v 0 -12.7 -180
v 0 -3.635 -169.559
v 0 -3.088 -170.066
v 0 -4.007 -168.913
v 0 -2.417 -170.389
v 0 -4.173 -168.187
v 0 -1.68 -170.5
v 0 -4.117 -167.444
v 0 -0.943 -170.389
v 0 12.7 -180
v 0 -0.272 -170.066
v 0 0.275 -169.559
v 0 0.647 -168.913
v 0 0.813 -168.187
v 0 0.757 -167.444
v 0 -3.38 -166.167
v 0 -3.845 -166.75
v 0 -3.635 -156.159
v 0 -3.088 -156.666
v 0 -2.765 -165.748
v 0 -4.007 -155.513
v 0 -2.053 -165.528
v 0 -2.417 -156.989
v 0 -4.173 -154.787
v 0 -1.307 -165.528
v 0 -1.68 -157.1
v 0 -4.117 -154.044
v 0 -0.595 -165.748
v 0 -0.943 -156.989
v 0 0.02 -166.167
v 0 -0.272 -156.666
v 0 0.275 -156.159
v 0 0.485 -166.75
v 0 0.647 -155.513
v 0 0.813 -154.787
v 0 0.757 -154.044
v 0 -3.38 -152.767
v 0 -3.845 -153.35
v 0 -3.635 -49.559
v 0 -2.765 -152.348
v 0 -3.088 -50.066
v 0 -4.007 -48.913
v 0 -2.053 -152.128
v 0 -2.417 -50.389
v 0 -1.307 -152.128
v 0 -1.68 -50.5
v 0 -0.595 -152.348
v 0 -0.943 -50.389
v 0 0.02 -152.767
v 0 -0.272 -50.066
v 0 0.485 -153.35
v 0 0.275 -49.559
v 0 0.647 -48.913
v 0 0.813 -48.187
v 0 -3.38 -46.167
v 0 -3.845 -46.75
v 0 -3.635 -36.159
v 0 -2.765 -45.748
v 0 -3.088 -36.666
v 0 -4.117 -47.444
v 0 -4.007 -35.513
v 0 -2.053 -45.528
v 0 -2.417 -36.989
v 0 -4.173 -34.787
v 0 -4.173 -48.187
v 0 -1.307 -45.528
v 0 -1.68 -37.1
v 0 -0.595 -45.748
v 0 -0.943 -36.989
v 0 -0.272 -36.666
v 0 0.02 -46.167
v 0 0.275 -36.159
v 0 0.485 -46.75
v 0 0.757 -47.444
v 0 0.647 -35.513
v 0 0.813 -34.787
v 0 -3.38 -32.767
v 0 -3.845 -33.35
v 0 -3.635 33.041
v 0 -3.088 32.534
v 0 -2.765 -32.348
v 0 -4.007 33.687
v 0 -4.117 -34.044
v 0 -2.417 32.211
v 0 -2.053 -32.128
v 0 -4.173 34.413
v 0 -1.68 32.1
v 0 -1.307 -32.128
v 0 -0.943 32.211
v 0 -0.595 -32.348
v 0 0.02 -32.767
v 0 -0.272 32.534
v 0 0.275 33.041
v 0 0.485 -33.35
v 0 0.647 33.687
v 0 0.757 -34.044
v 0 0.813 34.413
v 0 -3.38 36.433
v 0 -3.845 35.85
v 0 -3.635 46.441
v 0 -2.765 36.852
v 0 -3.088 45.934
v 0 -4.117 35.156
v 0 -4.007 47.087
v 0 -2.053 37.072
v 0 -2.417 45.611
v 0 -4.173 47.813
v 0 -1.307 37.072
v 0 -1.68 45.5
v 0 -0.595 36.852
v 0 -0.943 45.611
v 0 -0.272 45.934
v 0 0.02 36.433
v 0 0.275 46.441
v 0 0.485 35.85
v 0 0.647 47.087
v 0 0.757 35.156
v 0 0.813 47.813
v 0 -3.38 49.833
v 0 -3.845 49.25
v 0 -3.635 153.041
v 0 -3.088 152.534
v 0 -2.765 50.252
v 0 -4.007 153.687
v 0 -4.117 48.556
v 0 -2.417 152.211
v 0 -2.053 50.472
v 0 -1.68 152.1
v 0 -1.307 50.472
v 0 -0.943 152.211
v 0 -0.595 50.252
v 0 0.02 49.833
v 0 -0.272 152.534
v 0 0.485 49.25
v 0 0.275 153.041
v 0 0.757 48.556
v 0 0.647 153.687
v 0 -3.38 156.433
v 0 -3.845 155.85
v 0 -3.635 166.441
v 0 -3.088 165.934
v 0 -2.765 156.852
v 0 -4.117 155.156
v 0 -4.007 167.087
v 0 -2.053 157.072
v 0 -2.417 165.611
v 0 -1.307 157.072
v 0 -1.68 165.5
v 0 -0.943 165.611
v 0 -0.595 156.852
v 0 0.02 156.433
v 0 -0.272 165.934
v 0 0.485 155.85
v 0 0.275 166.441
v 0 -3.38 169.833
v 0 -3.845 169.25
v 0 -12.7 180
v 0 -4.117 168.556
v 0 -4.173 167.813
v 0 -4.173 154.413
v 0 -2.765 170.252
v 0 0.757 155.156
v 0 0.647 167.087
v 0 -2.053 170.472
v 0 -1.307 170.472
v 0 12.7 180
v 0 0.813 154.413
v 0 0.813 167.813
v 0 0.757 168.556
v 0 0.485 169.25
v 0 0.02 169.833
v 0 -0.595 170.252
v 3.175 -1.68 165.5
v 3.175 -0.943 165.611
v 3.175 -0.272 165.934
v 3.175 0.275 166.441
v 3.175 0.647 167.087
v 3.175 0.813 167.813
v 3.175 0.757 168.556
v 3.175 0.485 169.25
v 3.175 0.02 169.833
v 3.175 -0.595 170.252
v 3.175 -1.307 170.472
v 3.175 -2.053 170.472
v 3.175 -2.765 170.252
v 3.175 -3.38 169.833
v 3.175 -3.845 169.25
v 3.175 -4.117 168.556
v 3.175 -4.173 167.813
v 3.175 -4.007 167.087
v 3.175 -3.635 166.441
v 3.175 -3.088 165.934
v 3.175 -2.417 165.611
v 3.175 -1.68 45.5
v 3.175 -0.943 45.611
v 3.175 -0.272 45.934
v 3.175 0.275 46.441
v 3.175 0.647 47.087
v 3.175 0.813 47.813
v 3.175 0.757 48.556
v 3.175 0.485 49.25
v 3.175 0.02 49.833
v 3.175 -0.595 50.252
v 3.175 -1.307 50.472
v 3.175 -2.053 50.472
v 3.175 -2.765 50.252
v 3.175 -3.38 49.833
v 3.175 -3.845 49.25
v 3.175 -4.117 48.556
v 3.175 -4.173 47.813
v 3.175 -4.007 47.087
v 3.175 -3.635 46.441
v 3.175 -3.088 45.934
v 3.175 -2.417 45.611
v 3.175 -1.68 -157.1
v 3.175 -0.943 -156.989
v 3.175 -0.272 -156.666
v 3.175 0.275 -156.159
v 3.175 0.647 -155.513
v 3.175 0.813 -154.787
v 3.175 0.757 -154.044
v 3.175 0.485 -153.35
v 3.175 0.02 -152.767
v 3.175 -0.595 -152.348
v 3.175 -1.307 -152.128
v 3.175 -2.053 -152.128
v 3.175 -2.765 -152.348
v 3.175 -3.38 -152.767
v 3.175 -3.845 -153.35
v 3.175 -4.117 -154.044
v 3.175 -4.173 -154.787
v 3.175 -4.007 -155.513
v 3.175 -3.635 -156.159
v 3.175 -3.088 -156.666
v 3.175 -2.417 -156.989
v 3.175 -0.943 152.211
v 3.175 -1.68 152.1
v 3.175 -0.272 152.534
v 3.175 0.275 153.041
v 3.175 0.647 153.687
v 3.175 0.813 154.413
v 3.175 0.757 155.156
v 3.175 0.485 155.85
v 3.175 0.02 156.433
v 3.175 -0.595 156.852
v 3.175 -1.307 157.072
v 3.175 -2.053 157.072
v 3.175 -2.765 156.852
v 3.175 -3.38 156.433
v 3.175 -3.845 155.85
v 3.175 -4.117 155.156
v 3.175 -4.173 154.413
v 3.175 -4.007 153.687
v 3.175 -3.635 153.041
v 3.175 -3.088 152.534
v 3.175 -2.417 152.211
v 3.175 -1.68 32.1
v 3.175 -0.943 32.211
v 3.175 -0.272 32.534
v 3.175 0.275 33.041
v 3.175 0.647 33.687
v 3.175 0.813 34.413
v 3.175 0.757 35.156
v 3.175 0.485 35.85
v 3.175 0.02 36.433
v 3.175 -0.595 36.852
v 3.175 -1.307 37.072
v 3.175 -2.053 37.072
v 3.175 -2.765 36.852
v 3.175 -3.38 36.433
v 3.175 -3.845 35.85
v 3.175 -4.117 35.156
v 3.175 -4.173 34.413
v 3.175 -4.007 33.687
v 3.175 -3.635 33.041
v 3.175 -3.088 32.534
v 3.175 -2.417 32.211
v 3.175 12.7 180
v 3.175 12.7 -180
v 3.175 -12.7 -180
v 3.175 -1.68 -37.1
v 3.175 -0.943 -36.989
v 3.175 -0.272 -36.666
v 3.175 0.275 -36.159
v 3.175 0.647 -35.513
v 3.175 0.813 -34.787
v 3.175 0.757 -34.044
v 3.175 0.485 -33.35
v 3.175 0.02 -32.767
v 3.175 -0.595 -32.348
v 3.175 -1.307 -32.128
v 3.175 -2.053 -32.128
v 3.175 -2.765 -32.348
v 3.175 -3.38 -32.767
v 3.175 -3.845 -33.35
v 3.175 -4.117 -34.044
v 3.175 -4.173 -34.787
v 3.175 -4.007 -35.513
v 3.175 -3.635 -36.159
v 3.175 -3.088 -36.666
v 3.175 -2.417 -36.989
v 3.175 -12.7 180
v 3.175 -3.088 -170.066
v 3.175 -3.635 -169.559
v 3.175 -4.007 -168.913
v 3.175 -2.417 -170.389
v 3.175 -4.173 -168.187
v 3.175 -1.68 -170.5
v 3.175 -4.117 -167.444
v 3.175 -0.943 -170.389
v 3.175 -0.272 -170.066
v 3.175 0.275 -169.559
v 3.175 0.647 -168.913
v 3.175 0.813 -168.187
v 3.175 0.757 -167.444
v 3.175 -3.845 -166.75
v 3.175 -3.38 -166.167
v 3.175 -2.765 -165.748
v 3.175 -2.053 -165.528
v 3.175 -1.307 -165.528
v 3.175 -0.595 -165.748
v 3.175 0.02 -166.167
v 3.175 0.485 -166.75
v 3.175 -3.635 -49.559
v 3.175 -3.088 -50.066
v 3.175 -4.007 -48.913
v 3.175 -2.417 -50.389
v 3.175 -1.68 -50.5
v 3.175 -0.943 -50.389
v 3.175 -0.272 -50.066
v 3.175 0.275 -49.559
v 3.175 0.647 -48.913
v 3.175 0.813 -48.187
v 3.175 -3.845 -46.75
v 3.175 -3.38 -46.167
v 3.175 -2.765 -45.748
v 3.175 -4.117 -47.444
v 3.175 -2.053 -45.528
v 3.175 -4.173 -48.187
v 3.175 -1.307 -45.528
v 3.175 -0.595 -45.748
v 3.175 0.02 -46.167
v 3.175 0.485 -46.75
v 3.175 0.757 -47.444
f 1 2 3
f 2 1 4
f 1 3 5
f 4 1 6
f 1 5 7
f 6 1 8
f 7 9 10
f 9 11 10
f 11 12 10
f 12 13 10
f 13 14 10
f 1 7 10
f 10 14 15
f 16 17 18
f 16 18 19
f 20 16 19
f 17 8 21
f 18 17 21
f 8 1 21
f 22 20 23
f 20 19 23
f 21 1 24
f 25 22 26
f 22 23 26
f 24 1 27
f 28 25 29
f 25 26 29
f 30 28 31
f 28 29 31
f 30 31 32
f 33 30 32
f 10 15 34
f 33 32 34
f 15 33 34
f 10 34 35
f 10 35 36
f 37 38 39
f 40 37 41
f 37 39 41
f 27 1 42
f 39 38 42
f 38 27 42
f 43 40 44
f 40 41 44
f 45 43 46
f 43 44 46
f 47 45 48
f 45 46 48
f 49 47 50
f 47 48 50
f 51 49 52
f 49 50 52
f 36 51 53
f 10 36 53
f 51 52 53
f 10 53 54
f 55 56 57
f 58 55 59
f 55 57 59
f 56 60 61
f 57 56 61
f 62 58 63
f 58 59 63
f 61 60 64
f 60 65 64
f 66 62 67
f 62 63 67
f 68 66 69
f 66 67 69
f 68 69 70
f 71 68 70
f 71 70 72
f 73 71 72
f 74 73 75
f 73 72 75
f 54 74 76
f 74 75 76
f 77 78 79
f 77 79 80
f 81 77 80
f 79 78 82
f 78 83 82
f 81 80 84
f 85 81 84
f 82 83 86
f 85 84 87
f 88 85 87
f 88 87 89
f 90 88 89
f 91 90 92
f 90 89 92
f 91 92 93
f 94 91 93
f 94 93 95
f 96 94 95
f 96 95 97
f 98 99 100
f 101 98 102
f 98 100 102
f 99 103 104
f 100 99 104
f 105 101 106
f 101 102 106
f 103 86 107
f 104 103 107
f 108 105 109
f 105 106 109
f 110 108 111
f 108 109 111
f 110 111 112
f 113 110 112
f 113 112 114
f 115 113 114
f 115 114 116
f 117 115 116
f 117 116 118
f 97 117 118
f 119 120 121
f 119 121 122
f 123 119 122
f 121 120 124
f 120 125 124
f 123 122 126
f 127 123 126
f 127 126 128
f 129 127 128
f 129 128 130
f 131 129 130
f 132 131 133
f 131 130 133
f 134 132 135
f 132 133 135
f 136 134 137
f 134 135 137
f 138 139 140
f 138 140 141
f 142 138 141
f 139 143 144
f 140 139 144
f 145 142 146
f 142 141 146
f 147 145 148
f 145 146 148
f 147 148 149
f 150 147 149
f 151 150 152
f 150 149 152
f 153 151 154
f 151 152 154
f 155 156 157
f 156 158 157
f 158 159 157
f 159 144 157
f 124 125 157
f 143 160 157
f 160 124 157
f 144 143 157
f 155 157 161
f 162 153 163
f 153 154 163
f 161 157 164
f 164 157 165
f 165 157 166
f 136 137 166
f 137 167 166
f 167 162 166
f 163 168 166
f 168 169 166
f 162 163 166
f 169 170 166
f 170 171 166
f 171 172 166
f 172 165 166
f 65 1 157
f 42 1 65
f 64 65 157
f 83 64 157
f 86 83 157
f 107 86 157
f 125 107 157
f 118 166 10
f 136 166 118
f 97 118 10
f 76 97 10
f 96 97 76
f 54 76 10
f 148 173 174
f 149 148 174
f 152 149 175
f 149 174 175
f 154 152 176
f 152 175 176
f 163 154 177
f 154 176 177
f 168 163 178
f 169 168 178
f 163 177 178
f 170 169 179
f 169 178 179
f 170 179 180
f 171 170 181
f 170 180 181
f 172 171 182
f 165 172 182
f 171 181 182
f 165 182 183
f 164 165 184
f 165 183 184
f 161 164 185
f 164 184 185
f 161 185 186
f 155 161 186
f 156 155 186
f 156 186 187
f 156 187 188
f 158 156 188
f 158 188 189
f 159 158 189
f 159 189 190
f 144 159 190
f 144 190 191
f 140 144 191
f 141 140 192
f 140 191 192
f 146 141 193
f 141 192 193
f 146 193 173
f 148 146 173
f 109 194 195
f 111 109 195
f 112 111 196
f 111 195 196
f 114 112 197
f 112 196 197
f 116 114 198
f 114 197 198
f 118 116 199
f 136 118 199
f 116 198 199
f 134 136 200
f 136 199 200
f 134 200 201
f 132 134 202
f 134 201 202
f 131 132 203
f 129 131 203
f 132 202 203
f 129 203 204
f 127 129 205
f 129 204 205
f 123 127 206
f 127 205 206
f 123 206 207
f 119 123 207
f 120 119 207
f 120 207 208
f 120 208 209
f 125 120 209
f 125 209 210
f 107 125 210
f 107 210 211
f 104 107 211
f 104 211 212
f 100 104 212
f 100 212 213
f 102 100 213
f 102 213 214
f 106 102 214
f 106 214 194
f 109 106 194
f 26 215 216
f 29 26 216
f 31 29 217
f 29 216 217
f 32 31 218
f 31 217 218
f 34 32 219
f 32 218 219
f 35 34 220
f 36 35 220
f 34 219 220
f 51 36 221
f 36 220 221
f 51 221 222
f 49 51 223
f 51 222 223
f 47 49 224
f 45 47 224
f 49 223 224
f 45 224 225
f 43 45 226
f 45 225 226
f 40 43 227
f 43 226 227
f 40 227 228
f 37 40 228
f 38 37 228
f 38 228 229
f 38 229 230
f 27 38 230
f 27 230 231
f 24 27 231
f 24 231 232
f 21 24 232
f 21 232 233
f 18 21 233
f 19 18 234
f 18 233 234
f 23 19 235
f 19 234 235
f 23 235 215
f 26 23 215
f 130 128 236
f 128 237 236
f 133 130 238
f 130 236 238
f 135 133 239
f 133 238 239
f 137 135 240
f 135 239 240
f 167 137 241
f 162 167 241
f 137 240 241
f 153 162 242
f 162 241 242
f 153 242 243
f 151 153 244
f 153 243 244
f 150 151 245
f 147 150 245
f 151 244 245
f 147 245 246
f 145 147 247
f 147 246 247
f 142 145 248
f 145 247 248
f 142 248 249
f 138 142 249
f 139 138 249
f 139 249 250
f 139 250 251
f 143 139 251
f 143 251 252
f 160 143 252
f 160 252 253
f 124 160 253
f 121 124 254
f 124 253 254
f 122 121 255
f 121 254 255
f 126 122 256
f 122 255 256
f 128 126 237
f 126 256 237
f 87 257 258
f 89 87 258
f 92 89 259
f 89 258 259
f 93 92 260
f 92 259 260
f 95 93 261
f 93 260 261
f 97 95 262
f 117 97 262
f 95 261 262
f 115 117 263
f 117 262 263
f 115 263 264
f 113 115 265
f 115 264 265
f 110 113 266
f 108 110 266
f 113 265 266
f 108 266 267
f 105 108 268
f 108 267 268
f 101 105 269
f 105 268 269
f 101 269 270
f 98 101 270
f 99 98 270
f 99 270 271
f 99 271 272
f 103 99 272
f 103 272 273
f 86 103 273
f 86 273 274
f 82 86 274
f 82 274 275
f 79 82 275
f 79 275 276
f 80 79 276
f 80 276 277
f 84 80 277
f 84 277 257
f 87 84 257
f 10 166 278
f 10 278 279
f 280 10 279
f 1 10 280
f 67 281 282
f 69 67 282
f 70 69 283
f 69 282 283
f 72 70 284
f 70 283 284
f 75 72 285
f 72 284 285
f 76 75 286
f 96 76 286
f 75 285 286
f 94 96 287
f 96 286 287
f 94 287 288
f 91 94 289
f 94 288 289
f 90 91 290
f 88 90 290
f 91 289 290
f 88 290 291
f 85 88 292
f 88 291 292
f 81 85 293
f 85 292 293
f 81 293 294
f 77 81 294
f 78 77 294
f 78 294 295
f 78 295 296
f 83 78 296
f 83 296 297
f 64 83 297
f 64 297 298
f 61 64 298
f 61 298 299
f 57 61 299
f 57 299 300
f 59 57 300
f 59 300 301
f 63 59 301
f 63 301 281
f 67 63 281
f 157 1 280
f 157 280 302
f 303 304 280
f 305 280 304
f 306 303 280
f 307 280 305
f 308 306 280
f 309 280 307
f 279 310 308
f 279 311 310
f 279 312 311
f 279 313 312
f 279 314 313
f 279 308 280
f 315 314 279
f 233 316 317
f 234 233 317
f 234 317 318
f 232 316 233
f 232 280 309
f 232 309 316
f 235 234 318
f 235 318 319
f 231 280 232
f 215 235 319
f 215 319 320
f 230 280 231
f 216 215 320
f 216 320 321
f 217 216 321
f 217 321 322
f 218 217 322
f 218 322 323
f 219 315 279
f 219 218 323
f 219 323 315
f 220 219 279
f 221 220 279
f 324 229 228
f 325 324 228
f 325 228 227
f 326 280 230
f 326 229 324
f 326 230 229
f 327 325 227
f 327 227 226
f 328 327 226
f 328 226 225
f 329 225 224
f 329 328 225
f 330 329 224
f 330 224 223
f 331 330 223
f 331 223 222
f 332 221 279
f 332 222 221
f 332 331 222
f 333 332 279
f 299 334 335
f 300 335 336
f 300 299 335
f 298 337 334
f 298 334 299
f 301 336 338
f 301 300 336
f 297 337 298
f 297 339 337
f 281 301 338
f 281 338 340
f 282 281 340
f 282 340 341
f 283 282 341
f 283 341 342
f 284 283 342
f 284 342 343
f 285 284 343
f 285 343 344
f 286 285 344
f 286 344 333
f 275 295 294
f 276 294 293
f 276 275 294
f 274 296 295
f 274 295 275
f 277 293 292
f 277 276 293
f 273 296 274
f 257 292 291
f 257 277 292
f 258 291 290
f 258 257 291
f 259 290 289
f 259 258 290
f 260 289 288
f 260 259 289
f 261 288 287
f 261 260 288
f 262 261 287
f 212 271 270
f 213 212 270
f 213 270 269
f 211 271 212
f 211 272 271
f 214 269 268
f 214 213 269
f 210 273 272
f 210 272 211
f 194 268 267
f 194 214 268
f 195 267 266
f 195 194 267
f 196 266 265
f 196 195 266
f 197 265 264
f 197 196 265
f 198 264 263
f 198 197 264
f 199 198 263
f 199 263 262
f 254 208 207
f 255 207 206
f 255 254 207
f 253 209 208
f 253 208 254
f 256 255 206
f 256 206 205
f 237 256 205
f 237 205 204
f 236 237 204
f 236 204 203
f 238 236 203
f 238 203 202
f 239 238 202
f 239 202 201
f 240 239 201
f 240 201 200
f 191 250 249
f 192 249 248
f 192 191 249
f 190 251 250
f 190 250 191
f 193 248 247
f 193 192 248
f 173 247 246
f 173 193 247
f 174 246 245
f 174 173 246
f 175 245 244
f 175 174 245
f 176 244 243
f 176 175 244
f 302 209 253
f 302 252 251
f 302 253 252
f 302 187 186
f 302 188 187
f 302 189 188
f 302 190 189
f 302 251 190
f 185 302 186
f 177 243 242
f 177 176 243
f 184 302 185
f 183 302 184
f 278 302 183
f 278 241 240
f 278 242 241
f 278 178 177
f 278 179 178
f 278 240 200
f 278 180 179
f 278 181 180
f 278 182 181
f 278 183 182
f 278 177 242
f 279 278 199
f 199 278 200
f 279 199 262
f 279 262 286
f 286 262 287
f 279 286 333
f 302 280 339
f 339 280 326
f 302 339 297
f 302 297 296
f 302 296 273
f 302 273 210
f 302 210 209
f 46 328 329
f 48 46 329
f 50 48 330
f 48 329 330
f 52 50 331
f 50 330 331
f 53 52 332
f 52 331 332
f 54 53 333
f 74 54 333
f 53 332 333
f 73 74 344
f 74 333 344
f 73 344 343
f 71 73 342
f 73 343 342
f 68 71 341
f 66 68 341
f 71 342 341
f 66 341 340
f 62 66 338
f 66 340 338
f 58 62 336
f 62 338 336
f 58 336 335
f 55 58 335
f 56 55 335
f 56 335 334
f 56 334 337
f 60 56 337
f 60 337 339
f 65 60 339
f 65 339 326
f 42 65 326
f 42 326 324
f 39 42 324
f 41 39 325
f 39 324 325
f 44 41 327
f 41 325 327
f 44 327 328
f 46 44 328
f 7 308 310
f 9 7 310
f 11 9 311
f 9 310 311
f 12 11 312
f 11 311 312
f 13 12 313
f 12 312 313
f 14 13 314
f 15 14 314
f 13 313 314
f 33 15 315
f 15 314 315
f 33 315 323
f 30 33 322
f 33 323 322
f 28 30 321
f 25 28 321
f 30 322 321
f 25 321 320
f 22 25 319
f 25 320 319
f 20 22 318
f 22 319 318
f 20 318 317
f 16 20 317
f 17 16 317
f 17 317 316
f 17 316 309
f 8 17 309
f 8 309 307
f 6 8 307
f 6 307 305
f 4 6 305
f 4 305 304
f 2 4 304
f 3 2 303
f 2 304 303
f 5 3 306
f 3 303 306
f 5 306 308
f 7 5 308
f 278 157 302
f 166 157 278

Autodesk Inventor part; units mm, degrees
ref_plane "YZ Plane" through (0, 0, 0) normal (1, 0, 0) x (0, 1, 0)
ref_plane "XZ Plane" through (0, 0, 0) normal (0, 1, 0) x (-1, 0, 0)
ref_plane "XY Plane" through (0, 0, 0) normal (0, 0, 1) x (1, 0, 0)
sketch "Sketch1" plane through (0, 0, 0) normal (1, 0, 0) x (0, 1, 0)
  line L0 (-12.7, 180) -> (12.7, 180)
  line L1 (12.7, 180) -> (12.7, -180)
  line L2 (12.7, -180) -> (-12.7, -180)
  line L3 (-12.7, -180) -> (-12.7, 180)
  line L4 (-12.7, 180) -> (12.7, -180) construction
  line L5 (12.7, 180) -> (-12.7, -180) construction
  point P0 (0, 0)
  dimension "d0" = 25.4
  dimension "d1" = 360
extrude "Extrusion1" add sketch "Sketch1" along normal blind 3.175
sketch "Sketch2" plane through (3.175, 0, 0) normal (1, 0, 0) x (0, 0, -1)
  line L0 (180, -12.7) -> (180, 12.7) projected
  line L1 (180, 12.7) -> (-180, 12.7) projected
  line L2 (-180, 12.7) -> (-180, -12.7) projected
  line L3 (-180, -12.7) -> (180, -12.7) projected
  circle A0 centre (-168, -1.68) radius 2.5
  line L4 (180, 12.7) -> (-180, 12.7) projected
  line L5 (0, 12.7) -> (0, -12.7)
  circle A1 centre (168, -1.68) radius 2.5
  circle A2 centre (-154.6, -1.68) radius 2.5
  circle A3 centre (154.6, -1.68) radius 2.5
  point P0 (0, 0)
  dimension "d4" = 5
  dimension "d5" = 14.38
  dimension "d6" = 12
  dimension "d9" = 13.4
extrude "Extrusion2" cut sketch "Sketch2" against normal through all contours A0 | A1 | A2 | A3
sketch "Sketch3" plane through (3.175, 0, 0) normal (1, 0, 0) x (0, 0, -1)
  circle A0 centre (-168, -1.68) radius 2.5 projected
  circle A1 centre (154.6, -1.68) radius 2.5 projected
  circle A2 centre (168, -1.68) radius 2.5 projected
  circle A3 centre (-154.6, -1.68) radius 2.5 projected
  line L0 (180, -12.7) -> (180, 12.7) projected
  line L1 (180, 12.7) -> (-180, 12.7) projected
  line L2 (-180, 12.7) -> (-180, -12.7) projected
  line L3 (-180, -12.7) -> (180, -12.7) projected
  circle A4 centre (-168, -1.68) radius 2.5
  circle A5 centre (-154.6, -1.68) radius 2.5
  circle A6 centre (-48, -1.68) radius 2.5
  circle A7 centre (-34.6, -1.68) radius 2.5
  line L4 (0, 0) -> (0, 12.7)
  circle A8 centre (48, -1.68) radius 2.5
  circle A9 centre (34.6, -1.68) radius 2.5
  dimension "d12" = 120
extrude "Extrusion3" cut sketch "Sketch3" against normal through all contours A6 | A7 | A8 | A9
properties part number "PLENTINA_CANALETA_MOVIL" material "Steel, Mild, Welded"
